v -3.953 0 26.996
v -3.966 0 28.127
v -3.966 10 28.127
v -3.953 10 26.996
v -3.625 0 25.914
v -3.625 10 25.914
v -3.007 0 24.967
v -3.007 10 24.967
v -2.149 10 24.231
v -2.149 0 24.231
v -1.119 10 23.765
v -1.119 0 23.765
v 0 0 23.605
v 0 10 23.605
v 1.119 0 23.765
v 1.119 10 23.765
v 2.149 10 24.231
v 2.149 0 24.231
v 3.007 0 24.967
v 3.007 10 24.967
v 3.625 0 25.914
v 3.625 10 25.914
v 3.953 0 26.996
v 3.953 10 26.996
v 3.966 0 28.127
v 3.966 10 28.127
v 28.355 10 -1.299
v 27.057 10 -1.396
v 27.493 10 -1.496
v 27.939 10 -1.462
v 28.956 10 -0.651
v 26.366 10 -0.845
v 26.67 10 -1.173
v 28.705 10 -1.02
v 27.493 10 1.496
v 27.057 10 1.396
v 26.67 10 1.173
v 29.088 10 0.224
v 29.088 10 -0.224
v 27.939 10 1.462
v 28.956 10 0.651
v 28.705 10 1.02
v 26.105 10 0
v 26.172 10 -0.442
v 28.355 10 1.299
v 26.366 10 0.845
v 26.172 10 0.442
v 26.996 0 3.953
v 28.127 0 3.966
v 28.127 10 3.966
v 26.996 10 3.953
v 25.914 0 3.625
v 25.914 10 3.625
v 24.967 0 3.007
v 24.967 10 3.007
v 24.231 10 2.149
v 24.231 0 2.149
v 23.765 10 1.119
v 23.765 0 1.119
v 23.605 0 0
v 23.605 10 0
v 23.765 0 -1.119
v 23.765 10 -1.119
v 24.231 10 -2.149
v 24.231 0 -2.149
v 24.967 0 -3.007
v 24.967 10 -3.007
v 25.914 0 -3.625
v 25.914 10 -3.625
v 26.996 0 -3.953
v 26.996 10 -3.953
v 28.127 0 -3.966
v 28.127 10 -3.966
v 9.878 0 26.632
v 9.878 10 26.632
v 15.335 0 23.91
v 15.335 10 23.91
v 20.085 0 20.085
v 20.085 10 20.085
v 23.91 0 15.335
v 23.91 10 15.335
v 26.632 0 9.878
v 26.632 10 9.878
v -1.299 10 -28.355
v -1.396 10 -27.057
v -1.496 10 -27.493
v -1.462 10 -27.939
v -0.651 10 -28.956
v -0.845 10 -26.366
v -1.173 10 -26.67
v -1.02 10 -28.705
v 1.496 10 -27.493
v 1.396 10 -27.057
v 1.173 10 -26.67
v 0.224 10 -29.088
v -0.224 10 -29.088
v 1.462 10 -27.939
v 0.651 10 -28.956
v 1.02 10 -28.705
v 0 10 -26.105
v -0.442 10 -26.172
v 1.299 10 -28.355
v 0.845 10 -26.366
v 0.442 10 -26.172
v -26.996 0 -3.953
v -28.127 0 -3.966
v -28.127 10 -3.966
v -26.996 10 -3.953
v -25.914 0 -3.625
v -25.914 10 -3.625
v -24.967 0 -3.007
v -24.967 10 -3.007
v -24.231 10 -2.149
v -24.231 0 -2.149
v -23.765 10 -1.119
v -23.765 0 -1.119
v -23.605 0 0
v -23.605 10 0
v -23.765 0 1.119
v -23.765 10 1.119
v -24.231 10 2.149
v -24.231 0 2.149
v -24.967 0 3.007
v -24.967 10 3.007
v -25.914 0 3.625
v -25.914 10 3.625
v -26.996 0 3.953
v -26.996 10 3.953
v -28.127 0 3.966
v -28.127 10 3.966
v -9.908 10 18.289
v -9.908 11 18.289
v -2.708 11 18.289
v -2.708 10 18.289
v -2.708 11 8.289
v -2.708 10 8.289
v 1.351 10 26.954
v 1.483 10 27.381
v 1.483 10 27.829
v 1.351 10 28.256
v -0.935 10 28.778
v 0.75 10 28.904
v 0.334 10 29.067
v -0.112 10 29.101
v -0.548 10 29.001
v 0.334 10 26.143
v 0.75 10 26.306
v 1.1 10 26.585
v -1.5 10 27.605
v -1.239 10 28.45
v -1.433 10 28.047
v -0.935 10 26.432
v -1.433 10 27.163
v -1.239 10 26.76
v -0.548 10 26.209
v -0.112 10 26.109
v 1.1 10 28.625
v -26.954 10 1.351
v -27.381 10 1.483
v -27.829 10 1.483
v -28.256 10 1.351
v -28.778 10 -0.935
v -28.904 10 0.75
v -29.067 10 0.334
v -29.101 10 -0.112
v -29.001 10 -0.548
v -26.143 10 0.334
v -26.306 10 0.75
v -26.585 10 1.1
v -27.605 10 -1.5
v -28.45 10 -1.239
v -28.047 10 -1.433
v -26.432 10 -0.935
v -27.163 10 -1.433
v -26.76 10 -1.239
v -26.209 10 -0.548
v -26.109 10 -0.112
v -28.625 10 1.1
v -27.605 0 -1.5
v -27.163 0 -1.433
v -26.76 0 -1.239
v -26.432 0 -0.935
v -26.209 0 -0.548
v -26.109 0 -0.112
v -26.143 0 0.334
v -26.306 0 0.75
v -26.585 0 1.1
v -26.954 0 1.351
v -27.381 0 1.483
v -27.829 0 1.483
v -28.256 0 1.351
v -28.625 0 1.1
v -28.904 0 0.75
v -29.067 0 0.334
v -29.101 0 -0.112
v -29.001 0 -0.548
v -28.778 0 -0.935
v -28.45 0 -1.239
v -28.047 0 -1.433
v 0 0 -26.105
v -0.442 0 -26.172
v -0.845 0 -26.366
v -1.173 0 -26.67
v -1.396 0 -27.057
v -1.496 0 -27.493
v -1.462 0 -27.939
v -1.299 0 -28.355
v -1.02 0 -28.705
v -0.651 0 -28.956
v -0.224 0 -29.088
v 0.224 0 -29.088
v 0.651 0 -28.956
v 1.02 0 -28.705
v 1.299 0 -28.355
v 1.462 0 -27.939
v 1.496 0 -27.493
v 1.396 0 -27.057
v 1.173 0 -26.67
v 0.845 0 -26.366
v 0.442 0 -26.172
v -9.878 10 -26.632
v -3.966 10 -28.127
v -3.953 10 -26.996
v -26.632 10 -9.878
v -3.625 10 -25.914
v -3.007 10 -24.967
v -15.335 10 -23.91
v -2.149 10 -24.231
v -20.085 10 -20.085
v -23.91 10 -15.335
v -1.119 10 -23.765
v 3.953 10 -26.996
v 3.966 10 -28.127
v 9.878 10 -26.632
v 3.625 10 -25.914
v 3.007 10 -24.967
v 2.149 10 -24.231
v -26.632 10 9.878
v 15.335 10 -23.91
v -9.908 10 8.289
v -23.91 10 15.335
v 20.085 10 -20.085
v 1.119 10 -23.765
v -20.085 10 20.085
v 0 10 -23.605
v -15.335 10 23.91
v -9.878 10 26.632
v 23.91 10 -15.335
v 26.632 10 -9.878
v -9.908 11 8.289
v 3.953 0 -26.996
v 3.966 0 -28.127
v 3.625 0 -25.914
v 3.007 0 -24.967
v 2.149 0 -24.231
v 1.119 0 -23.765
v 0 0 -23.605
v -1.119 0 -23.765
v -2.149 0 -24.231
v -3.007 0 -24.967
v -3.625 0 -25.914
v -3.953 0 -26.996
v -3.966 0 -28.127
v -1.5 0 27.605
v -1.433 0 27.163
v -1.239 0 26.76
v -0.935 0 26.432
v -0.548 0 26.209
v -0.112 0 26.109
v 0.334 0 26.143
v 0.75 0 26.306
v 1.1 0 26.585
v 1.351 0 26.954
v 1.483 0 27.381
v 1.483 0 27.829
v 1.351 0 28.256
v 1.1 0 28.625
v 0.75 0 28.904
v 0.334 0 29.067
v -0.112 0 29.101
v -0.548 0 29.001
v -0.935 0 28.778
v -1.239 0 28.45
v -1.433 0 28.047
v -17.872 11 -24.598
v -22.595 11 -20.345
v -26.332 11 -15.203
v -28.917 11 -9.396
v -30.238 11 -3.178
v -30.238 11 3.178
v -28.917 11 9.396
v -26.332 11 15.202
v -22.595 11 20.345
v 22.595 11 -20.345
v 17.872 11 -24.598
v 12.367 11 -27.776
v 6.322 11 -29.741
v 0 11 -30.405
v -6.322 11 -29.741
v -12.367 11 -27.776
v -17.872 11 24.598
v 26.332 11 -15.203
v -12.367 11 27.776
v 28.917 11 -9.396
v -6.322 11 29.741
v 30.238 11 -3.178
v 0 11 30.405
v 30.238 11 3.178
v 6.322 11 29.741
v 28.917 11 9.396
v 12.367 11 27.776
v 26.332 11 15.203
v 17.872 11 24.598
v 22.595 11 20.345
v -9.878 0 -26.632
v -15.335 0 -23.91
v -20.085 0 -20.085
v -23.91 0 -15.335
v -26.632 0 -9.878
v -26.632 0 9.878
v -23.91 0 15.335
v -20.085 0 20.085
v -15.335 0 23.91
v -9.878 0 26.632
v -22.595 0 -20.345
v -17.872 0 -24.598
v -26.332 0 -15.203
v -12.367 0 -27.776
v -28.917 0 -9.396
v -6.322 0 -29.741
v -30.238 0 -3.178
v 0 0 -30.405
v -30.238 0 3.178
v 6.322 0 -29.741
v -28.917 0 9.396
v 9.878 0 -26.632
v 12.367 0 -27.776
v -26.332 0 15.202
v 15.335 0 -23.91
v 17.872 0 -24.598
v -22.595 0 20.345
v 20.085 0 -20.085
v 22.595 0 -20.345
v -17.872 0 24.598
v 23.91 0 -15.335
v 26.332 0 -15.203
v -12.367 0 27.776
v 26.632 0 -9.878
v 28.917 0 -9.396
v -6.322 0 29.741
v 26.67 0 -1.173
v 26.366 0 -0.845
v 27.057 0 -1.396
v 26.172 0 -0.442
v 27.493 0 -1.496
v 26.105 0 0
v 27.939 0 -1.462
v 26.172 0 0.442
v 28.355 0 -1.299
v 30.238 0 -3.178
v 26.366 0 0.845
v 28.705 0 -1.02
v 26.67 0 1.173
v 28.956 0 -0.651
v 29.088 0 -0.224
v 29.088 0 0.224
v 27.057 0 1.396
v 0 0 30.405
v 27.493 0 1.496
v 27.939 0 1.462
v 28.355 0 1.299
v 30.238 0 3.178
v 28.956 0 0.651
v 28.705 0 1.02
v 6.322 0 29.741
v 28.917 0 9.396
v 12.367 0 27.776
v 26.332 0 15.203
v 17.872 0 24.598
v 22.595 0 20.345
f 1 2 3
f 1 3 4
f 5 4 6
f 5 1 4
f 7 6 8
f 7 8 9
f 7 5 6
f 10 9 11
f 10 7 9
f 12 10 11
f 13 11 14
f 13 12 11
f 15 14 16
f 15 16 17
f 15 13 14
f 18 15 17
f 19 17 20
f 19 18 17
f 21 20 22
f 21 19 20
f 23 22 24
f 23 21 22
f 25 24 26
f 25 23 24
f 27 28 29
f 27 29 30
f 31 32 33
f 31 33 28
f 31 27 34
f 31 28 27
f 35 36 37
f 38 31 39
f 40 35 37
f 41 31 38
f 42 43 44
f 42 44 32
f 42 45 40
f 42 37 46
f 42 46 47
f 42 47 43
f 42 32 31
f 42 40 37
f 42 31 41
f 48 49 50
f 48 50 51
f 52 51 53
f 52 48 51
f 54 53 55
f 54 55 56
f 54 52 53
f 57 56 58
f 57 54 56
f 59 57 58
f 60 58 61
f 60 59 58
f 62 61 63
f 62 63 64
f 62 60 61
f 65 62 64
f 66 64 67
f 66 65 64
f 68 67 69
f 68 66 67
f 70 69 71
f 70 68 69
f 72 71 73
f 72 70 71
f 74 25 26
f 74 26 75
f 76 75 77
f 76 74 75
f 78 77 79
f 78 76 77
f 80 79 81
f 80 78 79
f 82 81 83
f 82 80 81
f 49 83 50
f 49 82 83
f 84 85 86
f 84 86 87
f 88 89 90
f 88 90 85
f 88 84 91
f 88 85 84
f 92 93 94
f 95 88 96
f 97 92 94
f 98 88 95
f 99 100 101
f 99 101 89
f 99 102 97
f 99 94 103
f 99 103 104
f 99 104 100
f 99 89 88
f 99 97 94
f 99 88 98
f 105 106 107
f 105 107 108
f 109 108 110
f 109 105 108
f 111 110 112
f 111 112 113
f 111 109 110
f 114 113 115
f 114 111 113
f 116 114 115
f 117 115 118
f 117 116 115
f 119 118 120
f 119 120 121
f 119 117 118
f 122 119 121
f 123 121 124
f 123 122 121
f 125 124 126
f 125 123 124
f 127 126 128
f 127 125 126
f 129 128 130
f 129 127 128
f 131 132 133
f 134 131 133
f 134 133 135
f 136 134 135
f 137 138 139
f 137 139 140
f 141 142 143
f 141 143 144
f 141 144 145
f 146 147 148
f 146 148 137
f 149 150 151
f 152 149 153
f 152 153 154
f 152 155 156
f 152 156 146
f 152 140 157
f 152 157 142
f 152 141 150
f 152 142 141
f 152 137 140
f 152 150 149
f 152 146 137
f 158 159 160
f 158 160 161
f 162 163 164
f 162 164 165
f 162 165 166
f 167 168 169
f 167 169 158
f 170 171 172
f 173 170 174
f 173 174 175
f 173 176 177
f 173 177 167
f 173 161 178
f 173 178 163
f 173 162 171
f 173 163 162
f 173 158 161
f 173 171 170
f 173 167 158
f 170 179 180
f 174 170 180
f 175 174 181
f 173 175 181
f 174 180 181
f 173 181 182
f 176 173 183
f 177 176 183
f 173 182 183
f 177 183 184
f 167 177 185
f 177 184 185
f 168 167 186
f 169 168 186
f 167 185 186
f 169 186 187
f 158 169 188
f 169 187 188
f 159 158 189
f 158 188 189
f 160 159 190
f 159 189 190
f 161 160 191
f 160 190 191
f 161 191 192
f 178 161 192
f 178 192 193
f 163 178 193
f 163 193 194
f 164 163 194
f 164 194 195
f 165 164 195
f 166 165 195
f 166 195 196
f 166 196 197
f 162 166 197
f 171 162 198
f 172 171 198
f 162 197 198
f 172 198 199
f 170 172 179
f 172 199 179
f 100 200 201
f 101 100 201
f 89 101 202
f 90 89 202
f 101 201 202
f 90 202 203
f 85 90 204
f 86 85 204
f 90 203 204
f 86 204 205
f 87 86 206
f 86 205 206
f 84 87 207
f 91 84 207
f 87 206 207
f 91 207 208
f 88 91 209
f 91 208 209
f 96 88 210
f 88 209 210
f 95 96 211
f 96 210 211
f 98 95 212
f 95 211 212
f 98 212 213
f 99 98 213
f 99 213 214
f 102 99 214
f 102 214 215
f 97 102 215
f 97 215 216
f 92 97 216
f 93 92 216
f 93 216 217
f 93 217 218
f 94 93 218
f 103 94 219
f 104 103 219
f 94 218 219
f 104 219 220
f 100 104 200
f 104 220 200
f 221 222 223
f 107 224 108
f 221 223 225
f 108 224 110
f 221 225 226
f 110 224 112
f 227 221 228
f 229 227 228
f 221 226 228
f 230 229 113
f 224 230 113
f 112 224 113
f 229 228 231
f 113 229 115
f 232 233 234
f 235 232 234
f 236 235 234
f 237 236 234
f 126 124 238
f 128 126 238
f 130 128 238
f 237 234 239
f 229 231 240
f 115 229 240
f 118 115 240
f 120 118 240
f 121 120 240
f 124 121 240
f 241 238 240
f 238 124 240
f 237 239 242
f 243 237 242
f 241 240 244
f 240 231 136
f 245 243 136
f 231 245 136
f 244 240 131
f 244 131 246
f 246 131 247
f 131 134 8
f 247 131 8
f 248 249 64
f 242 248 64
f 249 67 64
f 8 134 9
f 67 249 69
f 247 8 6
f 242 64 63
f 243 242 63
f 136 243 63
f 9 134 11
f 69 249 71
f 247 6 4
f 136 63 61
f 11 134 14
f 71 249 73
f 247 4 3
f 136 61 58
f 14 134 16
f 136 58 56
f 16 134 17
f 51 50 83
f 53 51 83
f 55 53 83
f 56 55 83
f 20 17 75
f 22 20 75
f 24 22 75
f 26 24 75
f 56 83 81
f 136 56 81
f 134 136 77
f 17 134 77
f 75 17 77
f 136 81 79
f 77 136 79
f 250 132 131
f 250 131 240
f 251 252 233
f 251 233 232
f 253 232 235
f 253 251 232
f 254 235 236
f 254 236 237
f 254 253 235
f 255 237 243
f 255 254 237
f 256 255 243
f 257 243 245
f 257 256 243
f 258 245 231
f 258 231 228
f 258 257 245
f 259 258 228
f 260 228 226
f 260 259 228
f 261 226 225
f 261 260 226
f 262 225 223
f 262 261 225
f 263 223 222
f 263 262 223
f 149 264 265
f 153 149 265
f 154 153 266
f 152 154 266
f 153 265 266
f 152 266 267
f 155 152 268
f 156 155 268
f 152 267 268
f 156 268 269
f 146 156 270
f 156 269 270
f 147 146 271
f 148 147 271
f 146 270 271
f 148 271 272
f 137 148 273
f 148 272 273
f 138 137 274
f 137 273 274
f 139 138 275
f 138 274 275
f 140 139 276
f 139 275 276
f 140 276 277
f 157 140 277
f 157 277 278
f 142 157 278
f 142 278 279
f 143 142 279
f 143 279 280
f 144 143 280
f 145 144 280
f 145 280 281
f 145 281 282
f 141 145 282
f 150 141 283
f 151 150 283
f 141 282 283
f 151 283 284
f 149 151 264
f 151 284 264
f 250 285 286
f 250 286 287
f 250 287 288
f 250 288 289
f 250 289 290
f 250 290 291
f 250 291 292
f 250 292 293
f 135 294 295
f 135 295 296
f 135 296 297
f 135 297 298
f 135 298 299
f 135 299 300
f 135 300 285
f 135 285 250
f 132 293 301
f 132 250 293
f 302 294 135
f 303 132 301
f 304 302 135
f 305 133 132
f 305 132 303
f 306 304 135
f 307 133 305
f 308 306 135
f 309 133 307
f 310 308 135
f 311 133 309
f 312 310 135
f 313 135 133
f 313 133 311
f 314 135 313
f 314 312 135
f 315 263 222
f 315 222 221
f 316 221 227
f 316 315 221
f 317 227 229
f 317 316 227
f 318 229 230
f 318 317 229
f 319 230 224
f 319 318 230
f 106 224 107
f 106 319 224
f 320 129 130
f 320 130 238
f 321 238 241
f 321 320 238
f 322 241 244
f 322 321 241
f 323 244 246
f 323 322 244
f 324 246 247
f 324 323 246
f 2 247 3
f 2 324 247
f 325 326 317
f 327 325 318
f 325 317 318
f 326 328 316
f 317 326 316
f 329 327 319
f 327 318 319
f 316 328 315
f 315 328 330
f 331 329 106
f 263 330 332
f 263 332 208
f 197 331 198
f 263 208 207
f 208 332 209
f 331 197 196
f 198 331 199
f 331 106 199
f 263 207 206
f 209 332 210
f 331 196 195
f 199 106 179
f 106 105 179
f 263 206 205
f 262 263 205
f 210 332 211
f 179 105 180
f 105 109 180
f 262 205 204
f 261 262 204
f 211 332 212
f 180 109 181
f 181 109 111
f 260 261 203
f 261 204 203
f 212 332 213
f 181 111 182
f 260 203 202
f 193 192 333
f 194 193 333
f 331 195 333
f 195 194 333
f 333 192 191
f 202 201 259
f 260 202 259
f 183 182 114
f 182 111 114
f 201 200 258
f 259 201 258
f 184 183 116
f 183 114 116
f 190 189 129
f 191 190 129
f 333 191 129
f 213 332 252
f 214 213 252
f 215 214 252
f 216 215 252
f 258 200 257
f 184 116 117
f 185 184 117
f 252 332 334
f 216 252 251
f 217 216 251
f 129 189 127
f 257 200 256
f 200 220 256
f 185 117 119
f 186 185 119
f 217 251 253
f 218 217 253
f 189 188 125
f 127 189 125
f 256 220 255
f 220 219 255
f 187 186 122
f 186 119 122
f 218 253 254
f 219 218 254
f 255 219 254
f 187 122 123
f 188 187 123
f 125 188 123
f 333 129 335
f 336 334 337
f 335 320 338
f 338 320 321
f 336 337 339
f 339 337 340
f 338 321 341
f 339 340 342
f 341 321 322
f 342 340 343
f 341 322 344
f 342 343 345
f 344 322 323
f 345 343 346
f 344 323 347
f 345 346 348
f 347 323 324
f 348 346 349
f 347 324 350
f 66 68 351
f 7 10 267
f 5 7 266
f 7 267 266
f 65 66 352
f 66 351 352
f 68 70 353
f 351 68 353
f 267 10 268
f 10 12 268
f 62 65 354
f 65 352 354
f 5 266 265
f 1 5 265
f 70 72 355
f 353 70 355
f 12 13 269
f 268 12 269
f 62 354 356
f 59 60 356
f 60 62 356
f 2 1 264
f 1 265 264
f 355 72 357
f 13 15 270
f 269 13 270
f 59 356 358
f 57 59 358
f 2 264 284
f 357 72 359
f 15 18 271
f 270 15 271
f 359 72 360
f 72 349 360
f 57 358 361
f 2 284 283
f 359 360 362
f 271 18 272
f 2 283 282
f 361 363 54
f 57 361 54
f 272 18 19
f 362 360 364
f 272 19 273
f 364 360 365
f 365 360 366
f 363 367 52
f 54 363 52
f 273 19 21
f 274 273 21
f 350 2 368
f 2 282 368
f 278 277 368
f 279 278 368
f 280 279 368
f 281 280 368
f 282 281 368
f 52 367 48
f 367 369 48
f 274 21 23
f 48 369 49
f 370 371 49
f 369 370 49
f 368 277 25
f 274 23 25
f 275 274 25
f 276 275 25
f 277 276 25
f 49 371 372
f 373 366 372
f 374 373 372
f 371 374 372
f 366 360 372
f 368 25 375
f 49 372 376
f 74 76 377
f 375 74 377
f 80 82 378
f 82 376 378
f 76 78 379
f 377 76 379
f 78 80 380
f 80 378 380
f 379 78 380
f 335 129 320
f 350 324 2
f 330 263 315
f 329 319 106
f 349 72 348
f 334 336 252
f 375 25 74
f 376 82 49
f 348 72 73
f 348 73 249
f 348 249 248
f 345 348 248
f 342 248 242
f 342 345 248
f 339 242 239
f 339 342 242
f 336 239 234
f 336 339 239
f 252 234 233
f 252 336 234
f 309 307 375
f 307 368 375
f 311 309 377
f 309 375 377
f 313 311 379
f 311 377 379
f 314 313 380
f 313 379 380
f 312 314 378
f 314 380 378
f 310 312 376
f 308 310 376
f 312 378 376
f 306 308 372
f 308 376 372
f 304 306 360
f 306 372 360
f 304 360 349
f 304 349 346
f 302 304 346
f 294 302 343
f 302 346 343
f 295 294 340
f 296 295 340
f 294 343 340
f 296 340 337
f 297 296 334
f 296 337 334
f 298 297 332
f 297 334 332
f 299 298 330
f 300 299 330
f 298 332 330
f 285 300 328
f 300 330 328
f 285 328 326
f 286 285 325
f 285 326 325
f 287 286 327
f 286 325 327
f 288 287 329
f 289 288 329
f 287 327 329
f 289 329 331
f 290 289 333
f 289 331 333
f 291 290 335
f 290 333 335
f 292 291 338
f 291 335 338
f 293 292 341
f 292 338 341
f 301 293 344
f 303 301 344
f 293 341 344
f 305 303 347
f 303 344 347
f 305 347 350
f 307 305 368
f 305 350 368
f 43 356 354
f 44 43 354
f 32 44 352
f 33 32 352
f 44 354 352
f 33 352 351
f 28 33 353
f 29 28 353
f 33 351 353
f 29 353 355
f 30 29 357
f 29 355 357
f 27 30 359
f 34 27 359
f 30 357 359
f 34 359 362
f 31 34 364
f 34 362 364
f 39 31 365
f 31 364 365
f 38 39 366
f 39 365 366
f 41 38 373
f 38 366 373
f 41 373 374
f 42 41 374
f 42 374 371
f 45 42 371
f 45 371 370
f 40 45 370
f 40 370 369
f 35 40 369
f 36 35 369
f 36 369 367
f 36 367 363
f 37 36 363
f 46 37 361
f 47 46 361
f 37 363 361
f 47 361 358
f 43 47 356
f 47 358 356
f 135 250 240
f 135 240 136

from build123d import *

# Parameters (mm, degrees)
SKIZZE1_R                       = 30.405
SKIZZE1_R_2                     = 28.405
AUFSATZ_LINEAR_AUSTRAGEN1_DEPTH = 10
SKIZZE2_R                       = 30.405
AUFSATZ_LINEAR_AUSTRAGEN2_DEPTH = 1
AUFSATZ_LINEAR_START            = 10
AUFSATZ_LINEAR_AUSTRAGEN3_DEPTH = 10
SKIZZE5_R                       = 1.5
SCHNITT_LINEAR_AUSTRAGEN2_DEPTH = 10
SKIZZE6_W                       = 7.2
SKIZZE6_H                       = 10
SCHNITT_LINEAR_AUSTRAGEN3_DEPTH = 10
KREISMUSTER1_COUNT              = 2
KREISMUSTER1_ANGLE              = 90


with BuildPart() as part:
    # Skizze1 → Aufsatz-Linear austragen1 (new body)
    with BuildSketch(Plane(origin=(0, 0, 0), x_dir=(1, 0, 0), z_dir=(0, 1, 0))):
        with Locations(Location((0, 0, 0), (0, 0, 270))):
            Circle(SKIZZE1_R)
        with Locations(Location((0, 0, 0), (0, 0, 270))):
            Circle(SKIZZE1_R_2, mode=Mode.SUBTRACT)
    extrude(amount=AUFSATZ_LINEAR_AUSTRAGEN1_DEPTH)

    # Skizze2 → Aufsatz-Linear austragen2 (add)
    with BuildSketch(Plane(origin=(0, 10, 0), x_dir=(1, 0, 0), z_dir=(0, 1, 0))):
        with Locations(Location((0, 0, 0), (0, 0, 270))):
            Circle(SKIZZE2_R)
    extrude(amount=AUFSATZ_LINEAR_AUSTRAGEN2_DEPTH)

    # Skizze4 → Aufsatz-Linear austragen3 (add)
    with BuildSketch(Plane.XZ.offset(-10).offset(AUFSATZ_LINEAR_START)):
        with BuildLine():
            ThreePointArc((-28.126789531, -3.965820935), (-23.605, 0), (-28.126789531, 3.965820935))
            ThreePointArc((-28.126789531, 3.965820935), (-28.405, 0), (-28.126789531, -3.965820935))
        make_face()
        with BuildLine():
            ThreePointArc((28.405, 0), (28.33536202, 1.987783738), (28.126789531, 3.965820935))
            ThreePointArc((28.126789531, 3.965820935), (23.605, 0), (28.126789531, -3.965820935))
            ThreePointArc((28.126789531, -3.965820935), (28.33536202, -1.987783738), (28.405, 0))
        make_face()
    aufsatz_linear_austragen3 = extrude(amount=-AUFSATZ_LINEAR_AUSTRAGEN3_DEPTH)

    # Skizze5 → Schnitt-Linear austragen2 (cut)
    with BuildSketch(Plane.XZ):
        with Locations(Location((-27.605, 0, 0), (0, 0, 270))):
            Circle(SKIZZE5_R)
        with BuildLine():
            ThreePointArc((29.105, 0), (27.605, 1.5), (26.105, 0))
            Line((26.105, 0), (29.105, 0))
        make_face()
        with BuildLine():
            Line((29.105, 0), (26.105, 0))
            ThreePointArc((26.105, 0), (27.605, -1.5), (29.105, 0))
        make_face()
    schnitt_linear_austragen2 = extrude(amount=-SCHNITT_LINEAR_AUSTRAGEN2_DEPTH, mode=Mode.SUBTRACT)

    # Skizze6 → Schnitt-Linear austragen3 (cut)
    with BuildSketch(Plane(origin=(0, 11, 0), x_dir=(1, 0, 0), z_dir=(0, 1, 0))):
        with Locations((-6.308057451, -13.288570201)):
            Rectangle(SKIZZE6_W, SKIZZE6_H)
    extrude(amount=-SCHNITT_LINEAR_AUSTRAGEN3_DEPTH, mode=Mode.SUBTRACT)

    # Kreismuster1: Aufsatz-Linear austragen3, Schnitt-Linear austragen2 ×2 about axis
    kreismuster1_axis = Axis((0, 0, 0), (0, 1, 0))
    add([aufsatz_linear_austragen3.rotate(kreismuster1_axis, i * KREISMUSTER1_ANGLE / (KREISMUSTER1_COUNT - 1)) for i in range(1, KREISMUSTER1_COUNT)])
    add([schnitt_linear_austragen2.rotate(kreismuster1_axis, i * KREISMUSTER1_ANGLE / (KREISMUSTER1_COUNT - 1)) for i in range(1, KREISMUSTER1_COUNT)], mode=Mode.SUBTRACT)


solid = part.part
